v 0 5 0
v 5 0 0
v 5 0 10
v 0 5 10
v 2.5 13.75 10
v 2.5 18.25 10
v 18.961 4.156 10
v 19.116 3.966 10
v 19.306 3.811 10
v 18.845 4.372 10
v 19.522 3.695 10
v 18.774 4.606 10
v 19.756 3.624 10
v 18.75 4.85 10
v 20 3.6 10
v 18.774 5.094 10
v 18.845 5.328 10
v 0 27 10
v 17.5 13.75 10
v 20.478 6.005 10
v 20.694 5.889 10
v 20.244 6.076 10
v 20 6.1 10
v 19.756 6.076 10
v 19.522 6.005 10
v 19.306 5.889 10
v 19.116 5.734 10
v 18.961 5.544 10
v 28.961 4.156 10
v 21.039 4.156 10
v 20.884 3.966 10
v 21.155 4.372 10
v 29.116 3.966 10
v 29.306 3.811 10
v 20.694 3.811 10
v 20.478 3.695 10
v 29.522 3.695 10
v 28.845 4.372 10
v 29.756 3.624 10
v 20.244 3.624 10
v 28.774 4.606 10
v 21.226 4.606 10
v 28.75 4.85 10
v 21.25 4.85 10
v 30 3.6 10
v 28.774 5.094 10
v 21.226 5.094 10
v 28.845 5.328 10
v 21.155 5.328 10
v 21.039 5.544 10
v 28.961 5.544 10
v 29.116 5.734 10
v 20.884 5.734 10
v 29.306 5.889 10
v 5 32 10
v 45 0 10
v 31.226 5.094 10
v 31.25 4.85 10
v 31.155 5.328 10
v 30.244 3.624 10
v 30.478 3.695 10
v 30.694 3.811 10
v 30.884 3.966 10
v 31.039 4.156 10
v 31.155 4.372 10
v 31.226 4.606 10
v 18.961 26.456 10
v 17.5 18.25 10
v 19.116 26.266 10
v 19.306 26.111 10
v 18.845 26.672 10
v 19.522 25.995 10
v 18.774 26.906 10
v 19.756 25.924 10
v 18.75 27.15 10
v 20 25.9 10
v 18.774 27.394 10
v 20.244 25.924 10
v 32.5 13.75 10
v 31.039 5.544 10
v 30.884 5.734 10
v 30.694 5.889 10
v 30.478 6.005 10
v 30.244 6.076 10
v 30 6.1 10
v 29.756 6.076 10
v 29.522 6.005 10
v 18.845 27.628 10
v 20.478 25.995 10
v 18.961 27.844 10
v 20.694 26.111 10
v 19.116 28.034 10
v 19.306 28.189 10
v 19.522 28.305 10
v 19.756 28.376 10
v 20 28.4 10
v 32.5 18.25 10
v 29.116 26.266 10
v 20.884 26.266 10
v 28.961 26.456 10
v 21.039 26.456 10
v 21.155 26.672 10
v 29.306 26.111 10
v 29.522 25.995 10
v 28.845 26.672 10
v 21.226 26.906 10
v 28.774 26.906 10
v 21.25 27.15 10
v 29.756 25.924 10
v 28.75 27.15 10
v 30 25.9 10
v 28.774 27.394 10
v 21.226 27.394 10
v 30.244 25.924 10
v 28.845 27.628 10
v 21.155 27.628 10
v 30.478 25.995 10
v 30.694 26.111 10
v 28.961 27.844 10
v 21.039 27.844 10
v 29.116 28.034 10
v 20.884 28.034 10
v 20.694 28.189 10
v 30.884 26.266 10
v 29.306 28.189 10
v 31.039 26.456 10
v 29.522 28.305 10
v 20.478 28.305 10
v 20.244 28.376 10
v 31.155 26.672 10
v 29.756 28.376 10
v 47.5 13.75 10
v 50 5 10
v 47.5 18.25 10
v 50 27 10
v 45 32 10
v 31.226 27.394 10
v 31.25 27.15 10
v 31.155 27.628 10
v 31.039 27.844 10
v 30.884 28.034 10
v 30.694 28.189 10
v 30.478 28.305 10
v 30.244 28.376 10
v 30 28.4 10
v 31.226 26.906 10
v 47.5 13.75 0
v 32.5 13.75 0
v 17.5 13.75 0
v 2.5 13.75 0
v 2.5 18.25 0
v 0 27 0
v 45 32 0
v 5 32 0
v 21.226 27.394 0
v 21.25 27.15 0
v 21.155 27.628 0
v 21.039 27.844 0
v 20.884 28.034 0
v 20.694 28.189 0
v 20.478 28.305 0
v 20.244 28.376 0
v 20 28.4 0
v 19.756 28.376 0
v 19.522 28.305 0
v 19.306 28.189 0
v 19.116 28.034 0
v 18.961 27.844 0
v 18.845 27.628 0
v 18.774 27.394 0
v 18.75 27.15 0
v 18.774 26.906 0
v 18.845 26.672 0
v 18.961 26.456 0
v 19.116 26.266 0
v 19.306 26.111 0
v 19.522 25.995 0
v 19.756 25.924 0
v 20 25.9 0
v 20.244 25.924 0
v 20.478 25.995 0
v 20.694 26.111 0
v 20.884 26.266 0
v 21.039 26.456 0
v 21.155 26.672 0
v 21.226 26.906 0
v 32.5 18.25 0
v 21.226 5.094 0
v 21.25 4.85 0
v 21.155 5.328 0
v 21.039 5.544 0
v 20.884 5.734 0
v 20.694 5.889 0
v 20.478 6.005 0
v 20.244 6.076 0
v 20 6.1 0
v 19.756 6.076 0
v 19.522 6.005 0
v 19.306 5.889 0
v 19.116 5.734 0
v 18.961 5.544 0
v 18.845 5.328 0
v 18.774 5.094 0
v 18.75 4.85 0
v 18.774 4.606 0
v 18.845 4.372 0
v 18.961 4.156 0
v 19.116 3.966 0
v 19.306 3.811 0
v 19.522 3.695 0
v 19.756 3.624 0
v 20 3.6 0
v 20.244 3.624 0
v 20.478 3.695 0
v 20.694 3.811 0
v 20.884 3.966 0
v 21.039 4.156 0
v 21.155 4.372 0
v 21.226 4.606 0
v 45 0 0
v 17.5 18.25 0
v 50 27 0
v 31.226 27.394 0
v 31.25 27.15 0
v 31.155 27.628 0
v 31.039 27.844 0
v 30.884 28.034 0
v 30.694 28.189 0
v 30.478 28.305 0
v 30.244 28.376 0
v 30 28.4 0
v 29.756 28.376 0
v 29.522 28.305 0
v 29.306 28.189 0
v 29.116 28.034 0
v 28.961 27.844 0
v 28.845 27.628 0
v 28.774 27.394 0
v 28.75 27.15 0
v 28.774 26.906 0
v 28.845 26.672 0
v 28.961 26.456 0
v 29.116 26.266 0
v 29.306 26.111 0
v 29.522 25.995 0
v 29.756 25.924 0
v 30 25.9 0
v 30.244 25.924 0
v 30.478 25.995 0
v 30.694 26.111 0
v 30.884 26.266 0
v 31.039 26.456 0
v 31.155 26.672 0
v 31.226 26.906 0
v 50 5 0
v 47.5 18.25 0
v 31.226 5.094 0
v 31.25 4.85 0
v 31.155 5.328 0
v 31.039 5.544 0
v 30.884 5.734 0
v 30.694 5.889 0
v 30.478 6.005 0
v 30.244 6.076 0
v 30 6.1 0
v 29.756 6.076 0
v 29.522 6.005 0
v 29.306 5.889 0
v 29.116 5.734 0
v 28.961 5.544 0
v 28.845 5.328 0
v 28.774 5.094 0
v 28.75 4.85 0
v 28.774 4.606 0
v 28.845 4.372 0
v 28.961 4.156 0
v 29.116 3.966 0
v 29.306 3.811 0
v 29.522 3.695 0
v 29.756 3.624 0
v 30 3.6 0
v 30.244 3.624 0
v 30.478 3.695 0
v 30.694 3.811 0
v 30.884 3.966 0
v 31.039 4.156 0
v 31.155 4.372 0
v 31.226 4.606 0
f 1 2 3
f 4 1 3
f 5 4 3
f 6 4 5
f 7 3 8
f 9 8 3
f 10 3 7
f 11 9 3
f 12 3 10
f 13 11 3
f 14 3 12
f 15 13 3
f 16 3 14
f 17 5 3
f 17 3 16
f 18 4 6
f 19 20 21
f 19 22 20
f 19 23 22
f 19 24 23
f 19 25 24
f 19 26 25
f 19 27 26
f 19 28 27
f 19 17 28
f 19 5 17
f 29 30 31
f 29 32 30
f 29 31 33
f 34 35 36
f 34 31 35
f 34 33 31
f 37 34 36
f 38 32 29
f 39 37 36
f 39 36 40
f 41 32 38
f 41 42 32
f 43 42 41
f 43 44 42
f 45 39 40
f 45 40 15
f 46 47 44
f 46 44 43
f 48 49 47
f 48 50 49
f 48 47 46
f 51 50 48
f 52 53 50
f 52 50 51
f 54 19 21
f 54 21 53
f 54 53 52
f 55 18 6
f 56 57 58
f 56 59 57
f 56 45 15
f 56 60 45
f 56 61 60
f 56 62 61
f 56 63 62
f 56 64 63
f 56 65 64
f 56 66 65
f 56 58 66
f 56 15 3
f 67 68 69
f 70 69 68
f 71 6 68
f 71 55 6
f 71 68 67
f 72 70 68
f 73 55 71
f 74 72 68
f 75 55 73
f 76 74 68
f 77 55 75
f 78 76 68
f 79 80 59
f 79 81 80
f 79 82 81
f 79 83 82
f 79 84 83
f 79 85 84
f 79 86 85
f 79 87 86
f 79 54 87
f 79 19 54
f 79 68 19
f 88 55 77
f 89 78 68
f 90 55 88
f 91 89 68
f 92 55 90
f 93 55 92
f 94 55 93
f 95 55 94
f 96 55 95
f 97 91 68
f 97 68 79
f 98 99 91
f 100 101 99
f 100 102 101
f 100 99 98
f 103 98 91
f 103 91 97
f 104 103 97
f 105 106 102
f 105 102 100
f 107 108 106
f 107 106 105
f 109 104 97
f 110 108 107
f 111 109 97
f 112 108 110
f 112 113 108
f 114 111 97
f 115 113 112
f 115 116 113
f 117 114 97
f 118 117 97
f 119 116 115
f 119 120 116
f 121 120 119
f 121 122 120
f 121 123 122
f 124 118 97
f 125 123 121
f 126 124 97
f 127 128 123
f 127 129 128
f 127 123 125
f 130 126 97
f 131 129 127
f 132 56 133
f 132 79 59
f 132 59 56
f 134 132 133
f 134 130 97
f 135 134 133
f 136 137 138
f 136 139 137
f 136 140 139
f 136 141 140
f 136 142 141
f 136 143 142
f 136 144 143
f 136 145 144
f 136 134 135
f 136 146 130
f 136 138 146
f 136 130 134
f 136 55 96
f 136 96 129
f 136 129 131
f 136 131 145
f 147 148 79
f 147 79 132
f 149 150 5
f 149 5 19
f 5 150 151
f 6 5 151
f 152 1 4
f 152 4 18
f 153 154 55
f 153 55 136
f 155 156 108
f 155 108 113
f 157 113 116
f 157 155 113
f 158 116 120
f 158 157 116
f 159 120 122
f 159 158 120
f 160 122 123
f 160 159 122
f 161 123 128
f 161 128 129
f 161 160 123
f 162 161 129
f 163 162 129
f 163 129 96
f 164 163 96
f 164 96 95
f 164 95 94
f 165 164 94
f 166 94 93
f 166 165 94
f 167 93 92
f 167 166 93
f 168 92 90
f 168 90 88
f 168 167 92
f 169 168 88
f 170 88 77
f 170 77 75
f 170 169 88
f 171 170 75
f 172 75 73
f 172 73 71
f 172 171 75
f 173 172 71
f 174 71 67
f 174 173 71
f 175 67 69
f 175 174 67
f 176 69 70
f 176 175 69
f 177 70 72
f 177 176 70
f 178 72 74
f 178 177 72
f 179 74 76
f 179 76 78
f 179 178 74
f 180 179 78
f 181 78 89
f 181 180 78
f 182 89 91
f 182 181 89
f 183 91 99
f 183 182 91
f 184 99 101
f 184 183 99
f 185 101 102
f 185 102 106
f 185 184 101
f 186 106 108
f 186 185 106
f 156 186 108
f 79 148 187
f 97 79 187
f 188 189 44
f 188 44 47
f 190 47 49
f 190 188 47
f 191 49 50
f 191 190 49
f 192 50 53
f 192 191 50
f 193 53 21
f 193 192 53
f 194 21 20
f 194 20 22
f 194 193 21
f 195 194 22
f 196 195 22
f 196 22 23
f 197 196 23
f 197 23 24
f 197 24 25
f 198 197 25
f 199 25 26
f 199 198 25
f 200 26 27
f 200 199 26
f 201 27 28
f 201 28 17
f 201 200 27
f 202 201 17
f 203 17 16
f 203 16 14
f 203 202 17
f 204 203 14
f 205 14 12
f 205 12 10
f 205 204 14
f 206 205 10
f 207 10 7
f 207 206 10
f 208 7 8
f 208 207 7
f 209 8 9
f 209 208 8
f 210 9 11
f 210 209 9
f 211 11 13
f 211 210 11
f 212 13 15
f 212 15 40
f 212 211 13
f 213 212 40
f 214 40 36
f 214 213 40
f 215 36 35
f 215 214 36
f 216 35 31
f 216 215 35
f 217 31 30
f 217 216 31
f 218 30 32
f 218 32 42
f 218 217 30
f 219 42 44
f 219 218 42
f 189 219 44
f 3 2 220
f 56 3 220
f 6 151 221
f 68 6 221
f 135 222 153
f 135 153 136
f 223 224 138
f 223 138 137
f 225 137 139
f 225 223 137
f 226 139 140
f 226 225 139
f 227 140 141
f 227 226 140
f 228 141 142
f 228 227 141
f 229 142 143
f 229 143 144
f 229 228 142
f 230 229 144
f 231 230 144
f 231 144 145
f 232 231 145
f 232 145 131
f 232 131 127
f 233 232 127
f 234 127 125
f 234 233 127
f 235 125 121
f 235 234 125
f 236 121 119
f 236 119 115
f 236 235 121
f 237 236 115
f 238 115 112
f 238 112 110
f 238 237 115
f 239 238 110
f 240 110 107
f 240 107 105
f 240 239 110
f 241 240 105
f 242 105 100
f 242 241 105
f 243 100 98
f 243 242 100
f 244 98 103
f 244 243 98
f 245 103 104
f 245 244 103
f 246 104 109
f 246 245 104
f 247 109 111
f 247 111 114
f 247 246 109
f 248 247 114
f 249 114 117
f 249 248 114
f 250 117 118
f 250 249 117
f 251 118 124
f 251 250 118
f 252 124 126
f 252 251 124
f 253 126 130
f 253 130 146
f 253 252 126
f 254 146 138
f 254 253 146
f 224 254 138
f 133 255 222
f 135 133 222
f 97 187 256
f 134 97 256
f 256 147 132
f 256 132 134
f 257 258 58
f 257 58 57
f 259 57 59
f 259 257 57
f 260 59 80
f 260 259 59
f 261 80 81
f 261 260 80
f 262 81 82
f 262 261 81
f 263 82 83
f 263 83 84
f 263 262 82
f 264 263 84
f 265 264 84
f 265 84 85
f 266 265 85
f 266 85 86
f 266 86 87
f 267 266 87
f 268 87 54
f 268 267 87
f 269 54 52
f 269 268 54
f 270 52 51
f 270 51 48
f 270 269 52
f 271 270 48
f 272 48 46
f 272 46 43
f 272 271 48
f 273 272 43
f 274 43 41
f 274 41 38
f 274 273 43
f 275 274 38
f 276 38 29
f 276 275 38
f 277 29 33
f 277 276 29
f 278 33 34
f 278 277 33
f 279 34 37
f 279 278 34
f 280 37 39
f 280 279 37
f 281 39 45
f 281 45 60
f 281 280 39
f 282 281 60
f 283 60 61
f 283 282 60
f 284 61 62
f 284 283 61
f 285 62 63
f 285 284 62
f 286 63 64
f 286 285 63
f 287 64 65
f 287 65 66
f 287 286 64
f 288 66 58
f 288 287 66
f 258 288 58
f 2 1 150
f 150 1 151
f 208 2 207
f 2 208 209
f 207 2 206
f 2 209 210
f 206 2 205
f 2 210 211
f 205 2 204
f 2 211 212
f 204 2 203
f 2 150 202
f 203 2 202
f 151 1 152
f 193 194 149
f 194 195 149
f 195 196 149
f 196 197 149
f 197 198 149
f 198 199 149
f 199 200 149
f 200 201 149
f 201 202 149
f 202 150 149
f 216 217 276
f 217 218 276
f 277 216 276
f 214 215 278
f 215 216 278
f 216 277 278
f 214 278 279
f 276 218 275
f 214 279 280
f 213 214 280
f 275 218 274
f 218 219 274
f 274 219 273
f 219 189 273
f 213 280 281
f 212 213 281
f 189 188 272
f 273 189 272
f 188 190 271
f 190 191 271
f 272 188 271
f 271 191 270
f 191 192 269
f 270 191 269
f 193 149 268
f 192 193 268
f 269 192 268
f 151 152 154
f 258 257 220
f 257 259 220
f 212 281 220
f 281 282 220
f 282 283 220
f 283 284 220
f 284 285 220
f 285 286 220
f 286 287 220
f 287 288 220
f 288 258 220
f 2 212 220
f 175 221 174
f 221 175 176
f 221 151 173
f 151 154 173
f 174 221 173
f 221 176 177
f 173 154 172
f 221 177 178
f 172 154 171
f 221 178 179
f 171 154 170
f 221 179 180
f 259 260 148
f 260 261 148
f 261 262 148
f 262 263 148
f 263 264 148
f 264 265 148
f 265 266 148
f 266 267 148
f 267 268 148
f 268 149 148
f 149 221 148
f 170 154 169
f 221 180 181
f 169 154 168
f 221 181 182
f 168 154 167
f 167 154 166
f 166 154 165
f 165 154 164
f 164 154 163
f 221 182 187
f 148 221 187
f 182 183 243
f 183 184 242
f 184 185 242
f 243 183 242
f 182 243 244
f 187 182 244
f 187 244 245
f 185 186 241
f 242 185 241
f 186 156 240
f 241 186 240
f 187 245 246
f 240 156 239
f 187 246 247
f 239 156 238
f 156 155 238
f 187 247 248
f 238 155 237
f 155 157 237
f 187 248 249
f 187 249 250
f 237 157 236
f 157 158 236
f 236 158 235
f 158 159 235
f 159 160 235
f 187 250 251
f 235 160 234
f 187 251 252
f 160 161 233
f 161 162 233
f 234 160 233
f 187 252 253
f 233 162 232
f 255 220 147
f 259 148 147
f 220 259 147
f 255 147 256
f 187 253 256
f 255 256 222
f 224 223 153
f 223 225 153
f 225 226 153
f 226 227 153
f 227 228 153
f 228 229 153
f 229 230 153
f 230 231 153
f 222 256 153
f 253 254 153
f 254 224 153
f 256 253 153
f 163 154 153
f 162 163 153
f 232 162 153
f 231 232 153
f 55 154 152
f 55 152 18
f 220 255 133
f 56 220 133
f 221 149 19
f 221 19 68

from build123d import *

# Parameters (mm, degrees)
F0_W     = 50
F0_H     = 32
F0_R     = 1.25
F0_W_2   = 15
F0_H_2   = 4.5
F1_DEPTH = 10
F2_SIZE  = 5


with BuildPart() as f1:
    # F0 (on Top) → F1 (new body)
    with BuildSketch(Plane.XY):
        with Locations((25, 16)):
            Rectangle(F0_W, F0_H)
        with Locations((20, 4.85)):
            Circle(F0_R, mode=Mode.SUBTRACT)
        with Locations((30, 4.85)):
            Circle(F0_R, mode=Mode.SUBTRACT)
        with Locations((10, 16)):
            Rectangle(F0_W_2, F0_H_2, mode=Mode.SUBTRACT)
        with Locations((20, 27.15)):
            Circle(F0_R, mode=Mode.SUBTRACT)
        with Locations((40, 16)):
            Rectangle(F0_W_2, F0_H_2, mode=Mode.SUBTRACT)
        with Locations((30, 27.15)):
            Circle(F0_R, mode=Mode.SUBTRACT)
    extrude(amount=F1_DEPTH)

    # F2
    f2_edges = [f1.edges().sort_by_distance(p)[0] for p in [
        (0, 0, 5),
        (50, 0, 5),
        (50, 32, 5),
        (0, 32, 5),
    ]]
    chamfer(f2_edges, length=F2_SIZE)


solid = f1.part
